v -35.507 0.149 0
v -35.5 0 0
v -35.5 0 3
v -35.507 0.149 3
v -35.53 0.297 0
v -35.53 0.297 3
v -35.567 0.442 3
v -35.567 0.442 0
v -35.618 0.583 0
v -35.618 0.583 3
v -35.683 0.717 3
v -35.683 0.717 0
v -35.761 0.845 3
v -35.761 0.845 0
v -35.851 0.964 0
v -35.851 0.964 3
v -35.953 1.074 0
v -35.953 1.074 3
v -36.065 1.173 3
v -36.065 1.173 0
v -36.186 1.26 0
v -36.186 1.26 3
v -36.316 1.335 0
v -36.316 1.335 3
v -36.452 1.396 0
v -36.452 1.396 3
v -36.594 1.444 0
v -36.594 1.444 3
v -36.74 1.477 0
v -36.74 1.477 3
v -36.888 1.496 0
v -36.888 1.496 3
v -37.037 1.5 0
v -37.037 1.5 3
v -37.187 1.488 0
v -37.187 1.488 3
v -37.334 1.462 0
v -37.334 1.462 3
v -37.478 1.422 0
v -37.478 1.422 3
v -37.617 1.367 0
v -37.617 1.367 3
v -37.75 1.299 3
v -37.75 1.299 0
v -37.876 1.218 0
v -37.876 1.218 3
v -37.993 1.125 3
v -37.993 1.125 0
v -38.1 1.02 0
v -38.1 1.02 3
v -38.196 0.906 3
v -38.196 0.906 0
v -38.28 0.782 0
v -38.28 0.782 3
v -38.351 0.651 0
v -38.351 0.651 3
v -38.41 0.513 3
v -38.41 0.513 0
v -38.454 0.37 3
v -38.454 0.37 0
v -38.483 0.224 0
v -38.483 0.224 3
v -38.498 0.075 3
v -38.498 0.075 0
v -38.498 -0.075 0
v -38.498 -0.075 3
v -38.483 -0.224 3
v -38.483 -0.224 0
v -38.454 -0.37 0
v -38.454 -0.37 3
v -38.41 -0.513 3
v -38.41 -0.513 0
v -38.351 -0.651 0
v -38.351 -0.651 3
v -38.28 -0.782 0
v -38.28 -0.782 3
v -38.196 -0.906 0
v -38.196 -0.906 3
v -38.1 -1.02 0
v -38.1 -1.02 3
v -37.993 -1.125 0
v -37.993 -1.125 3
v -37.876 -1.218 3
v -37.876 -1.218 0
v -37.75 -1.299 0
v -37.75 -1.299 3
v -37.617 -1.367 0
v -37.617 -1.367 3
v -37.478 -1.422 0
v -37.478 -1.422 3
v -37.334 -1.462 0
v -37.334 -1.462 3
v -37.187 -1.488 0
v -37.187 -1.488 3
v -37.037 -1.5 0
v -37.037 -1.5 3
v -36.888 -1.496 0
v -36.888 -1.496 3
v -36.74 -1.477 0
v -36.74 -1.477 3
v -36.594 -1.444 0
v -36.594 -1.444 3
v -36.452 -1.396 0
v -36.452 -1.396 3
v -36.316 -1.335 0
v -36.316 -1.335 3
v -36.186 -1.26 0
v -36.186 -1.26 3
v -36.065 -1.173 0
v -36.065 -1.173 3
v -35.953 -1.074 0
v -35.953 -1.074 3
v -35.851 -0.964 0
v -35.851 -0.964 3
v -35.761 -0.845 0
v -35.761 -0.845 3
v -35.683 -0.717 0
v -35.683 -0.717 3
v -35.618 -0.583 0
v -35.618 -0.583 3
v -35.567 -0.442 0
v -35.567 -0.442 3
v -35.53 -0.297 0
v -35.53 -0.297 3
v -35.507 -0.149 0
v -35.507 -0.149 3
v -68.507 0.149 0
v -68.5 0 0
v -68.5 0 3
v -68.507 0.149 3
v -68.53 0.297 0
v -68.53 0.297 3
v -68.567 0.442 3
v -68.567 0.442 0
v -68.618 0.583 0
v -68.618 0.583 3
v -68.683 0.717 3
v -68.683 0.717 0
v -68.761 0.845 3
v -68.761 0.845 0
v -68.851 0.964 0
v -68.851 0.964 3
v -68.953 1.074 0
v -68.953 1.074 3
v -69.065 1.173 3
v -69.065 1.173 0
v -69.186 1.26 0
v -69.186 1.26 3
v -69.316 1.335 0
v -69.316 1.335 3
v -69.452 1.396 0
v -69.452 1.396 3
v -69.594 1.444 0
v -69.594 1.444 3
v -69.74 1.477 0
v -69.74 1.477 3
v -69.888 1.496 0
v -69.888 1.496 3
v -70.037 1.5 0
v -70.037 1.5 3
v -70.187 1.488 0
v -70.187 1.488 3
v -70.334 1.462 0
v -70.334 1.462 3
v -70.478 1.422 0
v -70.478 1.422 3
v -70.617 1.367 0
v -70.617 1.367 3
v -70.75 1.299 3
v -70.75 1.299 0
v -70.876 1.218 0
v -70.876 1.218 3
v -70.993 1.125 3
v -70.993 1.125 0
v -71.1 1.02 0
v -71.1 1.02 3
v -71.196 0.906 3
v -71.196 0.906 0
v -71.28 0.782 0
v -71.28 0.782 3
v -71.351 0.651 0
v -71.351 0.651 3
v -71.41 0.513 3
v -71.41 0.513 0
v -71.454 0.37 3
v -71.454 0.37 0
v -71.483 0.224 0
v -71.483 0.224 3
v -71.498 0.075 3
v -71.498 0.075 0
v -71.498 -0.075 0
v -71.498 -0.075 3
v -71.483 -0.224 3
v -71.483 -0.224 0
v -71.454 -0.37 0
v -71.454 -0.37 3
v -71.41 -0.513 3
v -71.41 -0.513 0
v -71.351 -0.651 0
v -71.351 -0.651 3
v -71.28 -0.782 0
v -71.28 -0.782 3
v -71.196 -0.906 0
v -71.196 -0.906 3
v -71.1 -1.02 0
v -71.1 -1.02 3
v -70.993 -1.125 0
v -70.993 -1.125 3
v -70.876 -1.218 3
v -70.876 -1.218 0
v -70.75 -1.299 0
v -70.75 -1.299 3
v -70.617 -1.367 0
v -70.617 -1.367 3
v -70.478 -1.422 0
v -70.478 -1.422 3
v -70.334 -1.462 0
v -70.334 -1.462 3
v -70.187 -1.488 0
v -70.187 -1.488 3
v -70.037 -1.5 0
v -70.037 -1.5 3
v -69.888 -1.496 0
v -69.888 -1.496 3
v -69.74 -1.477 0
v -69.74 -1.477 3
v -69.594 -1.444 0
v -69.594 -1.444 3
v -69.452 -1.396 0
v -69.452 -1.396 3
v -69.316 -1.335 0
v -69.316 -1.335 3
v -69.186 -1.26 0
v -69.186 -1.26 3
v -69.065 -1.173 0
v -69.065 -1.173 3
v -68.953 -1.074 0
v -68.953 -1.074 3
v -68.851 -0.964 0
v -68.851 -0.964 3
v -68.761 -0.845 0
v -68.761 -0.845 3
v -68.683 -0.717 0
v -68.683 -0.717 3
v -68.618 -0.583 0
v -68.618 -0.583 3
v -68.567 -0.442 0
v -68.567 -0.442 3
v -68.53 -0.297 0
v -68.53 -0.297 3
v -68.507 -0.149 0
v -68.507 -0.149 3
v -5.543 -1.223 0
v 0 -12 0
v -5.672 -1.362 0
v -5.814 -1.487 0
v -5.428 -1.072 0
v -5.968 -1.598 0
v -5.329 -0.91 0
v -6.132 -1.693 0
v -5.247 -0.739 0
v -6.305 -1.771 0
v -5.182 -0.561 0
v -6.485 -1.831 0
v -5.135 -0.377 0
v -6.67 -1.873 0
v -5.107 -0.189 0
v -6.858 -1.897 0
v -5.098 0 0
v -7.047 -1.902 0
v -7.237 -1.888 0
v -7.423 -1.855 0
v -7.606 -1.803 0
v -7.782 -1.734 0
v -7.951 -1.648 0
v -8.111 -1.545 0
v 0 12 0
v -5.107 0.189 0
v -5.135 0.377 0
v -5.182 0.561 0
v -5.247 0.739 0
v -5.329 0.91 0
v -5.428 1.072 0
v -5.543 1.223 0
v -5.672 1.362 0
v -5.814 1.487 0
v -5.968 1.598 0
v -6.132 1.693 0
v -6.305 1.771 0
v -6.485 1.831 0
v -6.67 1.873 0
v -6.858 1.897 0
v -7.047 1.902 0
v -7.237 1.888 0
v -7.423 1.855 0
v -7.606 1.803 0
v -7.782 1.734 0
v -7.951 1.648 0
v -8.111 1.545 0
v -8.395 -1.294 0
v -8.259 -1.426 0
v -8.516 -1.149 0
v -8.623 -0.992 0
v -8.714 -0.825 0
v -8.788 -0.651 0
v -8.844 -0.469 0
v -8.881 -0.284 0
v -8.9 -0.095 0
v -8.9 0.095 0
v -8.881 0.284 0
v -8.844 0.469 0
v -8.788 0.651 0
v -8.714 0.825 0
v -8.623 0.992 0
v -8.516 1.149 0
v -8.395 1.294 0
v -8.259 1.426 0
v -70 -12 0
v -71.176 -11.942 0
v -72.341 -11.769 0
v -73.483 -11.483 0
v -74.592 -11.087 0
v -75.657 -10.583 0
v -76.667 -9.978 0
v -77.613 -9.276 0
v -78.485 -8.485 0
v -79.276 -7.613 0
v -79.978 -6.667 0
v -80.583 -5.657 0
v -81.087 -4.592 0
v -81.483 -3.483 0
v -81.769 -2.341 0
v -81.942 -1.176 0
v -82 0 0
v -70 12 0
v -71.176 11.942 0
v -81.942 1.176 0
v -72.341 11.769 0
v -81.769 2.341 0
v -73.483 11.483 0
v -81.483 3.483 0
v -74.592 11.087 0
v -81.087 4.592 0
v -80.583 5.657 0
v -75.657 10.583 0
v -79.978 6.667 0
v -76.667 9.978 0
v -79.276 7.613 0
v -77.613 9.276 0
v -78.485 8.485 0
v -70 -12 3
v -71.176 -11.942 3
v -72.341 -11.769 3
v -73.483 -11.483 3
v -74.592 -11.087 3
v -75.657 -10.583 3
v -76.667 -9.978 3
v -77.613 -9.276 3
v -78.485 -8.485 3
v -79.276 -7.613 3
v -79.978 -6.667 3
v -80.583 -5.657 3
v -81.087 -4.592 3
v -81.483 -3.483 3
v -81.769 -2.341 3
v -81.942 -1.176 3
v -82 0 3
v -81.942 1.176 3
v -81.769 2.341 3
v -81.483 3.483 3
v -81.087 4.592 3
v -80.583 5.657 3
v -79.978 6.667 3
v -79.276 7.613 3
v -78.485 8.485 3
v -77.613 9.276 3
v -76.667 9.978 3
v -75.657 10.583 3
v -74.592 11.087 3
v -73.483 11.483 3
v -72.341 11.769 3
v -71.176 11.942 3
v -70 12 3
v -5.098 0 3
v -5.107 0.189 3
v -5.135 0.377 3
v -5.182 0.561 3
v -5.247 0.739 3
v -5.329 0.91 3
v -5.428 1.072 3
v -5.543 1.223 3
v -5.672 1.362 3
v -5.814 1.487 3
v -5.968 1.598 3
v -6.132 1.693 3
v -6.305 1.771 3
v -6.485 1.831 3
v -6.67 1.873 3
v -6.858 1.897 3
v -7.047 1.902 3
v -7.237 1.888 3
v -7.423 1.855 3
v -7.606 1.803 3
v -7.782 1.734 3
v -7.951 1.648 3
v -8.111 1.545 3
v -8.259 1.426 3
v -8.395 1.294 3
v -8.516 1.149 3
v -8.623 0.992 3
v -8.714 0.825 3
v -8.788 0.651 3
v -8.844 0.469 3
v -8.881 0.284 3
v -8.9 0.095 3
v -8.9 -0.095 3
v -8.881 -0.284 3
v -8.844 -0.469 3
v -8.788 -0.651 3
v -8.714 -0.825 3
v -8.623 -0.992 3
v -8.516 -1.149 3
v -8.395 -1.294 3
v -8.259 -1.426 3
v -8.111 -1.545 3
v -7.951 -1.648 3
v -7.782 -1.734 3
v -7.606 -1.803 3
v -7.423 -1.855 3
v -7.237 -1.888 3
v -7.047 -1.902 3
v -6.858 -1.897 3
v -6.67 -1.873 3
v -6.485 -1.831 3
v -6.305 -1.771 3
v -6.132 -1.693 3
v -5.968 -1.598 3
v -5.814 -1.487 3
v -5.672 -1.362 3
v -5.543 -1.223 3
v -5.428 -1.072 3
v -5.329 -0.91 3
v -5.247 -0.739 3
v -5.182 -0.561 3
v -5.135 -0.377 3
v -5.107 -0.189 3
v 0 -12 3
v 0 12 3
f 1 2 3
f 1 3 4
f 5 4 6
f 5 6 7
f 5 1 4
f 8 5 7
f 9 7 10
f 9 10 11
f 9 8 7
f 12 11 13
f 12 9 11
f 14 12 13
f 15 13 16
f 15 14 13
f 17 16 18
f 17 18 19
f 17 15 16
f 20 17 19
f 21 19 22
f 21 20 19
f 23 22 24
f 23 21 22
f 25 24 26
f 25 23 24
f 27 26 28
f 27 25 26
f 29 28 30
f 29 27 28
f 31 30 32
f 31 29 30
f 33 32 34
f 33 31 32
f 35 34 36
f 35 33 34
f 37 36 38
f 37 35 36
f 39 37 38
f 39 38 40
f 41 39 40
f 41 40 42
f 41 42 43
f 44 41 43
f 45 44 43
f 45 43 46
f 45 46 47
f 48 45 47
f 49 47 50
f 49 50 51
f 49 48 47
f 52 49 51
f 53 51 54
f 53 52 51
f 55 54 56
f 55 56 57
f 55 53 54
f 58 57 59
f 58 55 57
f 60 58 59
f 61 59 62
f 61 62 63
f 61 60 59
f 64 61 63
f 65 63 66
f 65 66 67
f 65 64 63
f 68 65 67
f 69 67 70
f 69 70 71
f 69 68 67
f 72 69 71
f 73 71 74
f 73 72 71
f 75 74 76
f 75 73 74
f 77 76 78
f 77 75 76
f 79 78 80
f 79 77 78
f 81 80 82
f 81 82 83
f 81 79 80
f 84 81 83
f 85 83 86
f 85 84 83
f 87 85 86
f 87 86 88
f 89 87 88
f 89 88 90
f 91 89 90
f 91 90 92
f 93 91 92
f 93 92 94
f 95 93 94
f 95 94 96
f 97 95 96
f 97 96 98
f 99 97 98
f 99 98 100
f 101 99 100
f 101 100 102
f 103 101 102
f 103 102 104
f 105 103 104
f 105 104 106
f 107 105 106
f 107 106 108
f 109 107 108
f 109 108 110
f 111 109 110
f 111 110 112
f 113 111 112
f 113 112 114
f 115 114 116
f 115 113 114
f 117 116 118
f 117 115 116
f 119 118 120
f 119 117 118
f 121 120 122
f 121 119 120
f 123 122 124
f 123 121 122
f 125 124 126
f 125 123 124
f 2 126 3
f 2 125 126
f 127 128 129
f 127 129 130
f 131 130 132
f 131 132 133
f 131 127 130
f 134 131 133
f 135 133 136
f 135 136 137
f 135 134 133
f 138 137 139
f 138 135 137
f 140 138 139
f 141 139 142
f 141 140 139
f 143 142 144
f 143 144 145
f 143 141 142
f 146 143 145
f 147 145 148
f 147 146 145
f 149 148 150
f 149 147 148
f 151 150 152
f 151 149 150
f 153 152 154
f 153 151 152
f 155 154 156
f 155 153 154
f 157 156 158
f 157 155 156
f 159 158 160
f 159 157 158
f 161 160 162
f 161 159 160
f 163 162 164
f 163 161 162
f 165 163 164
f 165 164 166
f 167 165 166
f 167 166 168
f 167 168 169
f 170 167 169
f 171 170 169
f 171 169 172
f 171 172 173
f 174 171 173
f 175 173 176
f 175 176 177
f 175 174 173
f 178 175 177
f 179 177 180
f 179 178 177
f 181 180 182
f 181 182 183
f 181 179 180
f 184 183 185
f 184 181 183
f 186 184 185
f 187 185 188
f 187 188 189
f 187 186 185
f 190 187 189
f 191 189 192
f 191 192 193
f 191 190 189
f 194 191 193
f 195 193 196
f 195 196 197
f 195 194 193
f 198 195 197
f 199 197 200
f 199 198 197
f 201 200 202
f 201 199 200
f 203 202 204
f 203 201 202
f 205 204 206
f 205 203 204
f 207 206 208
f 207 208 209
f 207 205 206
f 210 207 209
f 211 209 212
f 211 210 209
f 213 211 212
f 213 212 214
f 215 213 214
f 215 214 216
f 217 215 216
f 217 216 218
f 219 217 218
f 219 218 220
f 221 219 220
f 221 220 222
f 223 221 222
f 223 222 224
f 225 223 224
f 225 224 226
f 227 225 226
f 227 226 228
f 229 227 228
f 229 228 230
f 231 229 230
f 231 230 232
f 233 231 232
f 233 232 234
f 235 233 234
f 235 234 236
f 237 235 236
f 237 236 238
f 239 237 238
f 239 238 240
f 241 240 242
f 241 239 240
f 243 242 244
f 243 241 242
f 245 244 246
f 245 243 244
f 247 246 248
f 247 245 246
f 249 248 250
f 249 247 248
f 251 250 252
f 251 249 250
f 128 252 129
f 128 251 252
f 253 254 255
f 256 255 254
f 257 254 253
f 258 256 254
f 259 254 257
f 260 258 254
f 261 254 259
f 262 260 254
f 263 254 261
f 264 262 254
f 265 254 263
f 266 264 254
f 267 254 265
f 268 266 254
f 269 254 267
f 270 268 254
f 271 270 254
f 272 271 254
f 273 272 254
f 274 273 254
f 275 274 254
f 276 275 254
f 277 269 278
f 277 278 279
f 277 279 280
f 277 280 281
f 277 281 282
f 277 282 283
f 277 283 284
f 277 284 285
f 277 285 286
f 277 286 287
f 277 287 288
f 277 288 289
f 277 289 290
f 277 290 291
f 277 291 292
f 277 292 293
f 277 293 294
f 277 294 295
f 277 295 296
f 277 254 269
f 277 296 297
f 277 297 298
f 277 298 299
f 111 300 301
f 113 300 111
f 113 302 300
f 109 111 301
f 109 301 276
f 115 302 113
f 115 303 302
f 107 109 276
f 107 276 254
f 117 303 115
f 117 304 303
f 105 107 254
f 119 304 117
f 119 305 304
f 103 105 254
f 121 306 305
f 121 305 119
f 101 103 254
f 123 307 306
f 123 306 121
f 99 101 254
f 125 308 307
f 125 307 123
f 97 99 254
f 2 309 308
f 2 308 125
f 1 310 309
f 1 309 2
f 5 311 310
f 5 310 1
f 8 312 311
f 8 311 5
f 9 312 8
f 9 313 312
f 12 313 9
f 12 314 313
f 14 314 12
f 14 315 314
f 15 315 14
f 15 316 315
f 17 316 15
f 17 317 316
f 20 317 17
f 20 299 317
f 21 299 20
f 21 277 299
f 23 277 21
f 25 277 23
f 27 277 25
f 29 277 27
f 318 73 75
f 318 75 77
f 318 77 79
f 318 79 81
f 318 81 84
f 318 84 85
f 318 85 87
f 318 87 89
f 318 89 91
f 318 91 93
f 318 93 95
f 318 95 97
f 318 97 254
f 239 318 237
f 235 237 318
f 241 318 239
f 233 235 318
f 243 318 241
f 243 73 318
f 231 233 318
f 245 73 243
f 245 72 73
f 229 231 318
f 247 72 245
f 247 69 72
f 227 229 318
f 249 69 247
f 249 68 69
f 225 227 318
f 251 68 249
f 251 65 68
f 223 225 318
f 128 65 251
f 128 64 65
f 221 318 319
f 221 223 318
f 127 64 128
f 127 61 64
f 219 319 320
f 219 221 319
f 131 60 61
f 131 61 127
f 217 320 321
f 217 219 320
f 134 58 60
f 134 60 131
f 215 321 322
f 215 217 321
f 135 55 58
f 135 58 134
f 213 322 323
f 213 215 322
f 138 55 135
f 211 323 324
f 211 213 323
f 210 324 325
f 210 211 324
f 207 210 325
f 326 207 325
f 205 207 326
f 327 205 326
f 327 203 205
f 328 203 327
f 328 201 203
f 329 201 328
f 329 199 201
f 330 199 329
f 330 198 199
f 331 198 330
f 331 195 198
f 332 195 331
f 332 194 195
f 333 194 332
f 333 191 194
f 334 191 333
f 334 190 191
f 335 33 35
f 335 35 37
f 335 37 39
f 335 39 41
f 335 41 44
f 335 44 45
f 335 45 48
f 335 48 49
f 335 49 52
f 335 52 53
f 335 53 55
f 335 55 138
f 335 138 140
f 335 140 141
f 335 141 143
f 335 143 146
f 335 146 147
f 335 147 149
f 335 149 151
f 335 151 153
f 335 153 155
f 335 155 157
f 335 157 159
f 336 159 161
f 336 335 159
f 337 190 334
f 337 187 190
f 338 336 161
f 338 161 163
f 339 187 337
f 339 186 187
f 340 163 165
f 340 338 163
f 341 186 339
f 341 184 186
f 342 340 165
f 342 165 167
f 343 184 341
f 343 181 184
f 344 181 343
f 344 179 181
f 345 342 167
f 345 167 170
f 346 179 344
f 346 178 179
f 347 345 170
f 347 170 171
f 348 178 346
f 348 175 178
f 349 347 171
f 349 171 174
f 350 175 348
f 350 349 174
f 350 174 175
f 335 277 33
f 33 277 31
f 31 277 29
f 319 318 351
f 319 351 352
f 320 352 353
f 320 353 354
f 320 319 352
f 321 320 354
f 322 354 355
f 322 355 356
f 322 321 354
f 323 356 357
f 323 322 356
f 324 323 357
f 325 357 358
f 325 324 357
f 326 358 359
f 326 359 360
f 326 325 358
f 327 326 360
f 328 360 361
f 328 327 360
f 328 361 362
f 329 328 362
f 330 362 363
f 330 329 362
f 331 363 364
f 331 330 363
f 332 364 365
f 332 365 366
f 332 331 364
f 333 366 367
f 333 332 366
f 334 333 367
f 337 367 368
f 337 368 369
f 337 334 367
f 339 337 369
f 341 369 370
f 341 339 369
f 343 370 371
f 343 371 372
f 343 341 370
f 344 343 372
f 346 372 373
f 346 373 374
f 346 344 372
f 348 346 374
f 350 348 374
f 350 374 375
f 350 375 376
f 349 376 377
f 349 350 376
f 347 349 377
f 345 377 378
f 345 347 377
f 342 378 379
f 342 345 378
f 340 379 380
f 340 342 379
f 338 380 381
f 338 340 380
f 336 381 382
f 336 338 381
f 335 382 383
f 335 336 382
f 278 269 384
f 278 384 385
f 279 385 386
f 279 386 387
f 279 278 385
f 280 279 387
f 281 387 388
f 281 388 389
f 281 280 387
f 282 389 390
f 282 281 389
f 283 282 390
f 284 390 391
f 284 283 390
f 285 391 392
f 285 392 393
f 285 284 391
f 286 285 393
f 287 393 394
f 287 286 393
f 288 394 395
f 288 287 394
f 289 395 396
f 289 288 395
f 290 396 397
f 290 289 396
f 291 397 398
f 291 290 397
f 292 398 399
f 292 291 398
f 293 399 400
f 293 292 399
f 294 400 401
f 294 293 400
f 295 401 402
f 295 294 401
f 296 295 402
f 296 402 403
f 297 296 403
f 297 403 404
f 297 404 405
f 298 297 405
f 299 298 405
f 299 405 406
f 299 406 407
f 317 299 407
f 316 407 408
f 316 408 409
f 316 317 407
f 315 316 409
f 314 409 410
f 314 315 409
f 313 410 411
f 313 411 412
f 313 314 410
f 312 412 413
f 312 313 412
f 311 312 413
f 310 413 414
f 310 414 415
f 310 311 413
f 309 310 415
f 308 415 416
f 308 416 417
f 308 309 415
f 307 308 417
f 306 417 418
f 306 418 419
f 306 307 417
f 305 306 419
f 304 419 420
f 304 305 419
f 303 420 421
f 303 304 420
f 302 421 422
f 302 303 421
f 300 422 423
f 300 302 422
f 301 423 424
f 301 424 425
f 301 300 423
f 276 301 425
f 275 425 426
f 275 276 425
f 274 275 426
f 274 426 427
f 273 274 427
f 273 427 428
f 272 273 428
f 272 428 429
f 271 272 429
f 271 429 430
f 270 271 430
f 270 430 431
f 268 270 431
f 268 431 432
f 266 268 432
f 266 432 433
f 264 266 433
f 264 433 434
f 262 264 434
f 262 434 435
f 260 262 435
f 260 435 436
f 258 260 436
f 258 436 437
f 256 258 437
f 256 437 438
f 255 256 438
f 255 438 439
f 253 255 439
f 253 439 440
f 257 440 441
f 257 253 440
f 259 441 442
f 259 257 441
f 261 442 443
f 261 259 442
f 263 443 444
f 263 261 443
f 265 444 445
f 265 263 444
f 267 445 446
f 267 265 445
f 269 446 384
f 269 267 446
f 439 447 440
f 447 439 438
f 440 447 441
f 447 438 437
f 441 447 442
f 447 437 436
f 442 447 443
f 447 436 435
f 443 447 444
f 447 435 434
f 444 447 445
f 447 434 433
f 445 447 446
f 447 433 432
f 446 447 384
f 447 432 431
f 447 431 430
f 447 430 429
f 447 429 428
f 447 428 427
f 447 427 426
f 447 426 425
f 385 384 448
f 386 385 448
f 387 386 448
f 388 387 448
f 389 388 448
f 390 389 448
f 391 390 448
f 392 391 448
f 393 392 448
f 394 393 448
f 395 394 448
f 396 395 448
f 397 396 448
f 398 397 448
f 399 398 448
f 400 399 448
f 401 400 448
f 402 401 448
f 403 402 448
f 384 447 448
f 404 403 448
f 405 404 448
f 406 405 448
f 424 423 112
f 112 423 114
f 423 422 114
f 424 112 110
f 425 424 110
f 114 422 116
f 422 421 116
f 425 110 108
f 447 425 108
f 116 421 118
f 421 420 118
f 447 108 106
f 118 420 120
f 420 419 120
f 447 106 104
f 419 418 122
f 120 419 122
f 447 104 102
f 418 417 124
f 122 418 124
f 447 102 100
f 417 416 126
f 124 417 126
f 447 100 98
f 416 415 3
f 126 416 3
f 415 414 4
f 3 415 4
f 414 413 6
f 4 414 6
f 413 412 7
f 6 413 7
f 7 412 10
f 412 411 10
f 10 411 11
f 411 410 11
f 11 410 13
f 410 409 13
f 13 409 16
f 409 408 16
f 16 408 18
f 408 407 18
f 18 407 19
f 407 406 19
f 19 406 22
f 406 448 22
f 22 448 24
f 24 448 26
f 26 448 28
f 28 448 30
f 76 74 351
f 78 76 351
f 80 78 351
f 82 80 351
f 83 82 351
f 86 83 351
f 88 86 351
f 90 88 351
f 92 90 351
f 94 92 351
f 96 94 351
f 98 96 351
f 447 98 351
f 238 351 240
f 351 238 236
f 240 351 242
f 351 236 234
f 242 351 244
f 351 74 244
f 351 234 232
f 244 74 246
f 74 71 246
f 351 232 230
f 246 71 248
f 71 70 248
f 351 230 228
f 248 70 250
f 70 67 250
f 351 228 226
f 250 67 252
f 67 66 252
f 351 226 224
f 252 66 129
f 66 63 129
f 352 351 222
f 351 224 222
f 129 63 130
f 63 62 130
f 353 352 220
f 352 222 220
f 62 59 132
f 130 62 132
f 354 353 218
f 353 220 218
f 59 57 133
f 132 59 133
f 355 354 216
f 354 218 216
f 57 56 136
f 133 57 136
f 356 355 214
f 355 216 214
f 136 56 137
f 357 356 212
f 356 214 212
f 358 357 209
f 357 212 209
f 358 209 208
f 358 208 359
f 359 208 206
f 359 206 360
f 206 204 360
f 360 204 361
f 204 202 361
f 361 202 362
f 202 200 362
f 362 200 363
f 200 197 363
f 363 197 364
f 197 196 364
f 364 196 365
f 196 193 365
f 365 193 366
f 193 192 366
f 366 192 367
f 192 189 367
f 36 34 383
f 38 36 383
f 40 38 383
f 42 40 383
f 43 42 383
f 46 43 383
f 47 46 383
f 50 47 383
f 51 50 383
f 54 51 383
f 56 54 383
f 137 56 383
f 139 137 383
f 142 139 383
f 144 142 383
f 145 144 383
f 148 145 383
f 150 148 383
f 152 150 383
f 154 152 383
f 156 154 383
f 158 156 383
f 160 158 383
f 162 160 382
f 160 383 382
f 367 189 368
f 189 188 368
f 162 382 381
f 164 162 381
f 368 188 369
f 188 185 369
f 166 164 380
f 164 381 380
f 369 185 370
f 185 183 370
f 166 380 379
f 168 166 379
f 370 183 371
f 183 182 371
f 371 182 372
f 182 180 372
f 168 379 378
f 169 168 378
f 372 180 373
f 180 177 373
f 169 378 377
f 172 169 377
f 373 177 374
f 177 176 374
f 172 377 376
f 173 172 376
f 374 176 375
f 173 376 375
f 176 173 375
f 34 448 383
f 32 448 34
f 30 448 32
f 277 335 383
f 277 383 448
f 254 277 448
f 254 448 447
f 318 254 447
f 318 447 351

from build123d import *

# Parameters (mm, degrees)
ESQUISSE1_R        = 1.5
ESQUISSE1_R_2      = 1.902389191
BOSS_EXTRU_1_DEPTH = 3


with BuildPart() as part:
    # Esquisse1 → Boss.-Extru.1 (new body)
    with BuildSketch(Plane.XY):
        with BuildLine():
            Line((-70, 12), (0, 12))
            Line((0, 12), (0, -12))
            Line((0, -12), (-70, -12))
            ThreePointArc((-70, -12), (-82, 0), (-70, 12))
        make_face()
        with Locations((-37, 0)):
            Circle(ESQUISSE1_R, mode=Mode.SUBTRACT)
        with Locations((-70, 0)):
            Circle(ESQUISSE1_R, mode=Mode.SUBTRACT)
        with Locations((-7, 0)):
            Circle(ESQUISSE1_R_2, mode=Mode.SUBTRACT)
    extrude(amount=BOSS_EXTRU_1_DEPTH)


solid = part.part
